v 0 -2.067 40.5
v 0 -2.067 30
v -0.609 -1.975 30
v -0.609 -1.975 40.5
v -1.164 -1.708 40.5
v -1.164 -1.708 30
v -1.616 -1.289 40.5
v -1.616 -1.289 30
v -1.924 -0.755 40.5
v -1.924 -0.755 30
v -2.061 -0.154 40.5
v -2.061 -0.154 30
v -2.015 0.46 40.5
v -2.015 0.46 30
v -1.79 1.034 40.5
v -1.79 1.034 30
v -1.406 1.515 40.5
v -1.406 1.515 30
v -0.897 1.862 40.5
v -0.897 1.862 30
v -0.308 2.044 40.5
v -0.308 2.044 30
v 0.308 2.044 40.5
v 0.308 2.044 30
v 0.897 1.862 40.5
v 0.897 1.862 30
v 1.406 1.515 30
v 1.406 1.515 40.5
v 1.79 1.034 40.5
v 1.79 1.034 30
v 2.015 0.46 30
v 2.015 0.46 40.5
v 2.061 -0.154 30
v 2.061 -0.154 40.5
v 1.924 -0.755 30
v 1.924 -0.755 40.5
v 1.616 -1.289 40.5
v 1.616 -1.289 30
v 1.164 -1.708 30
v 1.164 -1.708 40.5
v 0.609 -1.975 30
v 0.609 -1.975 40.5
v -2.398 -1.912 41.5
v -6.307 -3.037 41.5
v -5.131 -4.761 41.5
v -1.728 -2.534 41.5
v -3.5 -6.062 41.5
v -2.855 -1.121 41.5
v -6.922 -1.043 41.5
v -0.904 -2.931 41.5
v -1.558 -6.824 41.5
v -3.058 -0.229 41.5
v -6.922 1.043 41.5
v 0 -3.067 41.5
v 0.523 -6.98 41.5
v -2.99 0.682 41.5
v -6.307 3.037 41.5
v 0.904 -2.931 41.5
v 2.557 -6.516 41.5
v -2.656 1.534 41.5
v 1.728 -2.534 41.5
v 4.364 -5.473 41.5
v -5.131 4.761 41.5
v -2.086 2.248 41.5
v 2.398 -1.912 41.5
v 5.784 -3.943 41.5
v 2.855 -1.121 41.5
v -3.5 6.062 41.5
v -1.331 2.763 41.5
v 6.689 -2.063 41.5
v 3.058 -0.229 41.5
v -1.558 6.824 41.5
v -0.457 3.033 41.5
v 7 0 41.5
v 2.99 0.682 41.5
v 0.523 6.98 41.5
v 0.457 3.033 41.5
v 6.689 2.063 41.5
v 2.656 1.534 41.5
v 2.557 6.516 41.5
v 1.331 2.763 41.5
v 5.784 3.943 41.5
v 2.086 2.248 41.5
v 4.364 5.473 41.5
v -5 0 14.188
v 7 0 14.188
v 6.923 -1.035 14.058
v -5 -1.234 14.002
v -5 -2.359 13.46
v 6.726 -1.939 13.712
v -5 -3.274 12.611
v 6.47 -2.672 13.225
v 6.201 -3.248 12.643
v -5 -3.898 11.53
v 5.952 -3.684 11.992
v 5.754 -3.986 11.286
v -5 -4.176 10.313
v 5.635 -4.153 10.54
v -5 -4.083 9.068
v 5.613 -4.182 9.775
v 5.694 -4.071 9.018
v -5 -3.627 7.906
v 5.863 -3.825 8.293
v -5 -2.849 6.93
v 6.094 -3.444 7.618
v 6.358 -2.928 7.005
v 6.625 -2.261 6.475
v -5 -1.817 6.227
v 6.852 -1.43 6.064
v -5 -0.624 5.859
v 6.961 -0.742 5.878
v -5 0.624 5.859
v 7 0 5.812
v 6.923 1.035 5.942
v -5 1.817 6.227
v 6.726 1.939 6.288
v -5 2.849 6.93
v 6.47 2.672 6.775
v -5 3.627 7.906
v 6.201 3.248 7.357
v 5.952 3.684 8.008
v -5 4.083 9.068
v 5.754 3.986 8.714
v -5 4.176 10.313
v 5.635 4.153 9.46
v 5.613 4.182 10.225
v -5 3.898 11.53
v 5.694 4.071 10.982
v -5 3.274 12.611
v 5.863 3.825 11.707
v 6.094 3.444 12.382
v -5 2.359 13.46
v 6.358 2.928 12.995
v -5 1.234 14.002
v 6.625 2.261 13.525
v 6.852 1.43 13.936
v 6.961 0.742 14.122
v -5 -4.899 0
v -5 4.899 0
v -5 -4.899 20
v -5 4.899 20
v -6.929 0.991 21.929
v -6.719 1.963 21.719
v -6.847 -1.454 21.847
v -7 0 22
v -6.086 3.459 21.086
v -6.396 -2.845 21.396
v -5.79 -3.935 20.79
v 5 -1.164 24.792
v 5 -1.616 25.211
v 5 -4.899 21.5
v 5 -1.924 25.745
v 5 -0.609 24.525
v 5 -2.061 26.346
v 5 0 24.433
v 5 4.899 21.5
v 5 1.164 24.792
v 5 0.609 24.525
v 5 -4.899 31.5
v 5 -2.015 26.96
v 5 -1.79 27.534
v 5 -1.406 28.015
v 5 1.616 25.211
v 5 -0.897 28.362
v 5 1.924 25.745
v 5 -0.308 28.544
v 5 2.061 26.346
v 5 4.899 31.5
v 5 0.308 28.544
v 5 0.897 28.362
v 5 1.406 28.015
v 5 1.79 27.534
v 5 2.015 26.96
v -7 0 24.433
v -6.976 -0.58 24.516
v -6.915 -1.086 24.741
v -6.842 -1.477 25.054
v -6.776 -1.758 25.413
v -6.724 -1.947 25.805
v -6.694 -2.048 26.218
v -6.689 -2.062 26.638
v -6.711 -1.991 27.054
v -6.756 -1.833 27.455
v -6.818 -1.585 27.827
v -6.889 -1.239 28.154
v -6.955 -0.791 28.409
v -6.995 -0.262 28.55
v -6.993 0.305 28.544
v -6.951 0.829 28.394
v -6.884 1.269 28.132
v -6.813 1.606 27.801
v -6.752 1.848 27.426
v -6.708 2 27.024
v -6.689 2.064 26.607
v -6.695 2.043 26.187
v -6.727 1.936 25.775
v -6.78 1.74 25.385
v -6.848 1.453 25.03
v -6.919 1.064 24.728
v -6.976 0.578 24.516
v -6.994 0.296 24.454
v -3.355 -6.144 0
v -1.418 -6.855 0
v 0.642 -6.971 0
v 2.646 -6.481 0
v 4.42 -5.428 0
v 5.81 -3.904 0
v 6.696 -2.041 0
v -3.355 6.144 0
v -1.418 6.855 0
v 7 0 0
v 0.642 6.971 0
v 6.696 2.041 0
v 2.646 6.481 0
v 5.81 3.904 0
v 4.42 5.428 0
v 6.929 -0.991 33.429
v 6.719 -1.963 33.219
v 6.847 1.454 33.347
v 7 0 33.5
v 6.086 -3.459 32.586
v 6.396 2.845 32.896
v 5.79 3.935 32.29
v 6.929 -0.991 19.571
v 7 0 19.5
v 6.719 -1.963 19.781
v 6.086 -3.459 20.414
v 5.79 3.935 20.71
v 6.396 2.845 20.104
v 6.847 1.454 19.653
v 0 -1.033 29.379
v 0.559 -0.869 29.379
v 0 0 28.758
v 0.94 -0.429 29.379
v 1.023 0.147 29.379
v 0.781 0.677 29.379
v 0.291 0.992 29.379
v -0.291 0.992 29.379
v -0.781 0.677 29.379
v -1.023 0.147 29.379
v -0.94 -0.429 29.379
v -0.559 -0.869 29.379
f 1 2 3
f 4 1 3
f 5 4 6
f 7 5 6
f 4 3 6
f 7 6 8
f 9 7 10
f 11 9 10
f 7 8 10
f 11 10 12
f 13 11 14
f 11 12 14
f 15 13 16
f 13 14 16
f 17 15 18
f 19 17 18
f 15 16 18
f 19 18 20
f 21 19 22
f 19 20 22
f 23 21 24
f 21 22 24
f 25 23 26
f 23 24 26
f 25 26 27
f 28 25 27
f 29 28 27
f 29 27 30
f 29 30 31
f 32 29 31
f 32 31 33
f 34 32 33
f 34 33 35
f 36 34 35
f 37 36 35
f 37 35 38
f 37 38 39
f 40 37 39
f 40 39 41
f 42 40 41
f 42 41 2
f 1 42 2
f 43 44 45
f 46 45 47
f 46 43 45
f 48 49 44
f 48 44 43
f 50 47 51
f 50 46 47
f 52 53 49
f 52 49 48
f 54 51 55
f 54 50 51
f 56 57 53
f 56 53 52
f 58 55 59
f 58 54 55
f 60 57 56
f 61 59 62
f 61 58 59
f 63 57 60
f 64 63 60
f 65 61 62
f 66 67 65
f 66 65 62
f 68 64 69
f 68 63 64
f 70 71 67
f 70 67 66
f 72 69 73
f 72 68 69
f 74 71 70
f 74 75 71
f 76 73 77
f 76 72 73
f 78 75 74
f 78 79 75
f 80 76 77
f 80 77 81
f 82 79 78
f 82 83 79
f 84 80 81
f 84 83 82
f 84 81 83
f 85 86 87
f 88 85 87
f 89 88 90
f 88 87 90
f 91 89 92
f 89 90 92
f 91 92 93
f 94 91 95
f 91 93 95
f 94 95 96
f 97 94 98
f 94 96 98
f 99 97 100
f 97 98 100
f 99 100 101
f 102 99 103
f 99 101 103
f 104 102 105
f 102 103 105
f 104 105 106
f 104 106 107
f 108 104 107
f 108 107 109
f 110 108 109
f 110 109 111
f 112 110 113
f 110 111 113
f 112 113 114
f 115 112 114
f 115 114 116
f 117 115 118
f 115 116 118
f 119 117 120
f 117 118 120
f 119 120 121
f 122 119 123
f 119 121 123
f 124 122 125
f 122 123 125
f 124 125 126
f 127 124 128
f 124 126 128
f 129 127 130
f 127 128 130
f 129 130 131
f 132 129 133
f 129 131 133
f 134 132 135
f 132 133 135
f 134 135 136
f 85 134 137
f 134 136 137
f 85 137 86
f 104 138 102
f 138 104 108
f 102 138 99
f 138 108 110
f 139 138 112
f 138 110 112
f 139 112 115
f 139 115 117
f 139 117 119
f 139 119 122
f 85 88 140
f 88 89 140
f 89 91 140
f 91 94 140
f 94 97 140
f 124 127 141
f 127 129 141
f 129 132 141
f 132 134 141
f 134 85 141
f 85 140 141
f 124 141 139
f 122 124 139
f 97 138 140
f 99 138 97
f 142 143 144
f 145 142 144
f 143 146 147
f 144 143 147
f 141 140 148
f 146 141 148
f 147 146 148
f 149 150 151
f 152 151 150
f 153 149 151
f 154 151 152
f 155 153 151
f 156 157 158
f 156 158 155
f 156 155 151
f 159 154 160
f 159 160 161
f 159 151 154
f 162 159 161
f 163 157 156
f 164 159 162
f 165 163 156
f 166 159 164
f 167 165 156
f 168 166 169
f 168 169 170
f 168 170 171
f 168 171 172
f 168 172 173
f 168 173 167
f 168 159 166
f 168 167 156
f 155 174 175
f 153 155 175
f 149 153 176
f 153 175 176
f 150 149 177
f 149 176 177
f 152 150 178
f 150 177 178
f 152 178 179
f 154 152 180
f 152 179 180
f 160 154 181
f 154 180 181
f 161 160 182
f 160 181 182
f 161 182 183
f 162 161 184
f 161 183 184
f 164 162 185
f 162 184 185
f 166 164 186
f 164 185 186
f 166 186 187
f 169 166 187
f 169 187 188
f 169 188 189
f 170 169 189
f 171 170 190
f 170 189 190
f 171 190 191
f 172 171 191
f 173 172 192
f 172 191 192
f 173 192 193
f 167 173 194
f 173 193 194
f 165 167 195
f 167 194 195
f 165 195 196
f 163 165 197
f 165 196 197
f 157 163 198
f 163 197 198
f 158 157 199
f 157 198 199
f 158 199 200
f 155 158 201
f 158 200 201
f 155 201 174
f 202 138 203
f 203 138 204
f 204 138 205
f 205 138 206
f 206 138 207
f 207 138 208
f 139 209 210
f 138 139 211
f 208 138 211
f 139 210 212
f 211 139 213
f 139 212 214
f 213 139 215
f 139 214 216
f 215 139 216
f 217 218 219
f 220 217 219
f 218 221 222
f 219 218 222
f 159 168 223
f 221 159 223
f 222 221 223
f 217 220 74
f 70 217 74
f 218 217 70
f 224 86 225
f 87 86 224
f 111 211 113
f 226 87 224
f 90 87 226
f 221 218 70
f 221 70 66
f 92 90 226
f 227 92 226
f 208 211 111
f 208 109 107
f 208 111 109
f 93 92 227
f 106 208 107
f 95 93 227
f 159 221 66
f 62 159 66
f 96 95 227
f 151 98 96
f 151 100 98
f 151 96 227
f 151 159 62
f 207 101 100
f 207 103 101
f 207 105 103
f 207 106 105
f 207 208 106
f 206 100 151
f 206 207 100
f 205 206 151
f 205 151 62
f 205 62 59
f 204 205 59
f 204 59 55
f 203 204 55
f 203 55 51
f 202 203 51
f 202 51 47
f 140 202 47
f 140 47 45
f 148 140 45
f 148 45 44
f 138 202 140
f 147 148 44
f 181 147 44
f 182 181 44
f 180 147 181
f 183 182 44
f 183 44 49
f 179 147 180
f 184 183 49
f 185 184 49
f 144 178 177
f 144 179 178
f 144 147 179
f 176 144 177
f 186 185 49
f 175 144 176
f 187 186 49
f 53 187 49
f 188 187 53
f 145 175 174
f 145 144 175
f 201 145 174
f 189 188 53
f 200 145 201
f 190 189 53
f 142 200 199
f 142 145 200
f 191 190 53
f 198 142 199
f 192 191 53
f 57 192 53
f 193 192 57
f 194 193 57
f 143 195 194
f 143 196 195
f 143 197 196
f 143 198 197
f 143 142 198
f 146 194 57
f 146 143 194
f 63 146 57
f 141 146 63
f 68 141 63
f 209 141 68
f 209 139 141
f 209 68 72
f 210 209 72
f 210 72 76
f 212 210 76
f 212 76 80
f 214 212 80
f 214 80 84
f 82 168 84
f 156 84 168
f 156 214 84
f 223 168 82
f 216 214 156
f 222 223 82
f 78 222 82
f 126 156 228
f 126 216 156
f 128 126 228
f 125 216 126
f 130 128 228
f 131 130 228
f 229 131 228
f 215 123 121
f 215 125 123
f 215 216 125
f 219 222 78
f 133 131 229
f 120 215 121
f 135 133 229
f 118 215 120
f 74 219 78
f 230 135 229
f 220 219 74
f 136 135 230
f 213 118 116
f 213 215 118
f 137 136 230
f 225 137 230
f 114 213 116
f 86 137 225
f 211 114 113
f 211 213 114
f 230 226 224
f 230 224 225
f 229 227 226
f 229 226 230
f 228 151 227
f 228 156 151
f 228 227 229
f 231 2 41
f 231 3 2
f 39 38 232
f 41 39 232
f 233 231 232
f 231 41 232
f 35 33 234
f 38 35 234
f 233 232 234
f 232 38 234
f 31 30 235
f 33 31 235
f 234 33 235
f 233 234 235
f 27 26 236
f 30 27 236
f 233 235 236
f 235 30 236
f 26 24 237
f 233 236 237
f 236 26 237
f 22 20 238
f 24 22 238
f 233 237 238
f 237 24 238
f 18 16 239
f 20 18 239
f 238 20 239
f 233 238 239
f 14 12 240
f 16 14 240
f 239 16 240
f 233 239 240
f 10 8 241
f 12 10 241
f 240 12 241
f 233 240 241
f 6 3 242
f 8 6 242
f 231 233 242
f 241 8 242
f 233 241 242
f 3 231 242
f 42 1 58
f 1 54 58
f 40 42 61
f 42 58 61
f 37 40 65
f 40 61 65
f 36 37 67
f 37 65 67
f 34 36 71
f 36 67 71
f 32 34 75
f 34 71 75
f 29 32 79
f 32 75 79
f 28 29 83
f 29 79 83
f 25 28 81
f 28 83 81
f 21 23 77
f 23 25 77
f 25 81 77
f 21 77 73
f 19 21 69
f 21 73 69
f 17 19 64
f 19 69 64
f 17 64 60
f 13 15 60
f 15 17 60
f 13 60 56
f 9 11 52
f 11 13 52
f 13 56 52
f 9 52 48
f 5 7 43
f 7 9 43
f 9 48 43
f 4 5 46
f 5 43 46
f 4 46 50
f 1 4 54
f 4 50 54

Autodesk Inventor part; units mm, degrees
ref_plane "XY Plane" through (0, 0, 0) normal (0, 0, 1) x (1, 0, 0)
sketch "Skizze1" plane through (0, 0, 0) normal (0, 0, 1) x (1, 0, 0)
  circle A0 centre (0, 0) radius 7
  dimension "d0" = 14
extrude "Extrusion1" add sketch "Skizze1" along normal blind 41.5
sketch "Skizze2" plane through (0, 0, 41.5) normal (0, 0, 1) x (1, 0, 0)
  circle A0 centre (0, 0) radius 7 projected
hole "Bohrung1" at (0, 0, 41.5) direction (0, 0, -1) diameter 4.134 depth 11.5 tip angle 118 thread size "M5x0.8" class "6H" standard "ISO Metric profile"
chamfer "Fasen1" distance 1 angle 45 1 edges at (0, 2.067, 41.5)
ref_plane "Arbeitsebene1" through (-7, 0, 0) normal (1, 0, 0) x (0, 1, 0)
ref_plane "Arbeitsebene2" through (0, -7, 0) normal (0, 1, 0) x (-1, 0, 0)
ref_plane "Arbeitsebene3" through (7, 0, 0) normal (1, 0, 0) x (0, 1, 0)
sketch "Skizze6" plane through (7, 0, 0) normal (1, 0, 0) x (0, 1, 0)
  line L0 (-7, 0) -> (-7, 41.5) projected
  line L1 (7, 0) -> (7, 41.5) projected
  line L2 (-7, 21.5) -> (7, 21.5)
  line L3 (7, 21.5) -> (7, 31.5)
  line L4 (7, 31.5) -> (-7, 31.5)
  line L5 (-7, 31.5) -> (-7, 21.5)
  line L6 (7, 41.5) -> (-7, 41.5) projected
  point P0 (0, 0)
  point P1 (-7, 31.5)
  point P2 (7, 21.5)
  dimension "d29" = 10
  dimension "d30" = 10
extrude "Extrusion4" cut sketch "Skizze6" against normal blind 2 contours L0 L4 L1 L2
sketch "Skizze7" plane through (5, 0, 0) normal (1, 0, 0) x (0, 0, -1)
  line L0 (-21.5, -4.899) -> (-21.5, 4.899) projected
  line L1 (0, 7) -> (0, -7) projected
  point P0 (0, 0)
  point P1 (-26.5, 0)
  point P2 (0, 0)
  point P3 (0, 0)
  point P4 (0, 0)
  dimension "d33" = 5
hole "Bohrung3" at (5, 0, 26.5) direction (-1, 0, 0) diameter 4.134 end through all thread size "M5x0.8" class "6H" standard "ISO Metric profile"
ref_plane "Arbeitsebene4" through (0, 7, 0) normal (0, 1, 0) x (-1, 0, 0)
sketch "Skizze8" plane through (0, 7, 0) normal (0, 1, 0) x (-1, 0, 0)
  line L0 (-5, 21.5) -> (-5, 21.5) projected
  line L1 (-5, 24.433) -> (-5, 28.567) projected
  line L2 (-5, 21.5) -> (-5, 31.5) projected
  line L3 (-5, 31.5) -> (-5, 21.5) projected
  line L4 (-5, 31.5) -> (-7, 31.5) projected
  line L5 (-5, 31.5) -> (-5, 21.5) projected
  line L6 (-5, 21.5) -> (-5, 31.5) projected
  line L7 (-5, 31.5) -> (-5, 31.5) projected
  line L8 (-7, 21.5) -> (-5, 21.5) projected
  line L9 (-5, 21.5) -> (-7, 19.5)
  line L10 (-7, 0) -> (-7, 41.5) projected
  line L11 (-5, 21.5) -> (-2.1716, 21.5) construction
  line L12 (-7, 19.5) -> (-7, 21.5)
  line L13 (-5, 31.5) -> (-7, 33.5)
  line L14 (-5, 31.5) -> (-2.1716, 31.5) construction
  line L15 (-7, 33.5) -> (-7, 31.5)
  point P0 (0, 0)
  dimension "d42" = 135
  dimension "d43" = 135
extrude "Extrusion5" cut sketch "Skizze8" against normal through all contours L9 L10 L8 | L4 L10 L13
sketch "Skizze9" plane through (-7, 0, 0) normal (1, 0, 0) x (0, 1, 0)
  line L0 (7, 0) -> (7, 41.5) projected
  line L1 (-7, 0) -> (-7, 41.5) projected
  line L2 (7, 0) -> (-7, 0)
  line L3 (-7, 0) -> (-7, 20)
  line L4 (-7, 20) -> (7, 20)
  line L5 (7, 20) -> (7, 0)
  point P0 (0, 0)
  point P1 (7, 20)
  dimension "d46" = 20
extrude "Extrusion6" cut sketch "Skizze9" along normal blind 2
sketch "Skizze10" plane through (0, -7, 0) normal (0, 1, 0) x (-1, 0, 0)
  line L0 (7, 20) -> (5, 20) projected
  line L1 (5, 20) -> (5, 20) projected
  line L2 (5, 20) -> (7, 22)
  line L3 (7, 20) -> (7, 41.5) projected
  line L4 (5, 20) -> (7.8284, 20) construction
  point P0 (0, 0)
  dimension "d49" = 45
extrude "Extrusion7" cut sketch "Skizze10" along normal through all
sketch "Skizze11" plane through (-5, 0, 0) normal (-1, 0, 0) x (0, 0, 1)
  line L0 (0, -4.899) -> (0, 4.899) projected
  point P0 (0, 0)
  point P1 (10, 0)
  point P2 (0, 0)
  point P3 (0, 0)
  dimension "d52" = 10
hole "Bohrung4" at (-5, 0, 10) direction (1, 0, 0) diameter 8.376 end through all thread size "M10x1.5" class "6H" standard "ISO Metric profile"
properties part number "TS_V1_Fallmagazin_Zylinderanbindung_int"
